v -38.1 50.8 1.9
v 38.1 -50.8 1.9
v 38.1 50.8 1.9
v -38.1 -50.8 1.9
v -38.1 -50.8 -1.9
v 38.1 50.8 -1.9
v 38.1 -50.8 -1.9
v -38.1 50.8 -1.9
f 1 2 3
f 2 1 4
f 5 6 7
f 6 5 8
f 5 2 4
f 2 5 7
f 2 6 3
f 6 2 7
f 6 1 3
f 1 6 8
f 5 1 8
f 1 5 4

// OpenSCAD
//Plate for maintaining orthogonality when measuring material sheets
length = 76.2;
width = 101.6;
height = 3.8;
cube([length,width,height], true);
